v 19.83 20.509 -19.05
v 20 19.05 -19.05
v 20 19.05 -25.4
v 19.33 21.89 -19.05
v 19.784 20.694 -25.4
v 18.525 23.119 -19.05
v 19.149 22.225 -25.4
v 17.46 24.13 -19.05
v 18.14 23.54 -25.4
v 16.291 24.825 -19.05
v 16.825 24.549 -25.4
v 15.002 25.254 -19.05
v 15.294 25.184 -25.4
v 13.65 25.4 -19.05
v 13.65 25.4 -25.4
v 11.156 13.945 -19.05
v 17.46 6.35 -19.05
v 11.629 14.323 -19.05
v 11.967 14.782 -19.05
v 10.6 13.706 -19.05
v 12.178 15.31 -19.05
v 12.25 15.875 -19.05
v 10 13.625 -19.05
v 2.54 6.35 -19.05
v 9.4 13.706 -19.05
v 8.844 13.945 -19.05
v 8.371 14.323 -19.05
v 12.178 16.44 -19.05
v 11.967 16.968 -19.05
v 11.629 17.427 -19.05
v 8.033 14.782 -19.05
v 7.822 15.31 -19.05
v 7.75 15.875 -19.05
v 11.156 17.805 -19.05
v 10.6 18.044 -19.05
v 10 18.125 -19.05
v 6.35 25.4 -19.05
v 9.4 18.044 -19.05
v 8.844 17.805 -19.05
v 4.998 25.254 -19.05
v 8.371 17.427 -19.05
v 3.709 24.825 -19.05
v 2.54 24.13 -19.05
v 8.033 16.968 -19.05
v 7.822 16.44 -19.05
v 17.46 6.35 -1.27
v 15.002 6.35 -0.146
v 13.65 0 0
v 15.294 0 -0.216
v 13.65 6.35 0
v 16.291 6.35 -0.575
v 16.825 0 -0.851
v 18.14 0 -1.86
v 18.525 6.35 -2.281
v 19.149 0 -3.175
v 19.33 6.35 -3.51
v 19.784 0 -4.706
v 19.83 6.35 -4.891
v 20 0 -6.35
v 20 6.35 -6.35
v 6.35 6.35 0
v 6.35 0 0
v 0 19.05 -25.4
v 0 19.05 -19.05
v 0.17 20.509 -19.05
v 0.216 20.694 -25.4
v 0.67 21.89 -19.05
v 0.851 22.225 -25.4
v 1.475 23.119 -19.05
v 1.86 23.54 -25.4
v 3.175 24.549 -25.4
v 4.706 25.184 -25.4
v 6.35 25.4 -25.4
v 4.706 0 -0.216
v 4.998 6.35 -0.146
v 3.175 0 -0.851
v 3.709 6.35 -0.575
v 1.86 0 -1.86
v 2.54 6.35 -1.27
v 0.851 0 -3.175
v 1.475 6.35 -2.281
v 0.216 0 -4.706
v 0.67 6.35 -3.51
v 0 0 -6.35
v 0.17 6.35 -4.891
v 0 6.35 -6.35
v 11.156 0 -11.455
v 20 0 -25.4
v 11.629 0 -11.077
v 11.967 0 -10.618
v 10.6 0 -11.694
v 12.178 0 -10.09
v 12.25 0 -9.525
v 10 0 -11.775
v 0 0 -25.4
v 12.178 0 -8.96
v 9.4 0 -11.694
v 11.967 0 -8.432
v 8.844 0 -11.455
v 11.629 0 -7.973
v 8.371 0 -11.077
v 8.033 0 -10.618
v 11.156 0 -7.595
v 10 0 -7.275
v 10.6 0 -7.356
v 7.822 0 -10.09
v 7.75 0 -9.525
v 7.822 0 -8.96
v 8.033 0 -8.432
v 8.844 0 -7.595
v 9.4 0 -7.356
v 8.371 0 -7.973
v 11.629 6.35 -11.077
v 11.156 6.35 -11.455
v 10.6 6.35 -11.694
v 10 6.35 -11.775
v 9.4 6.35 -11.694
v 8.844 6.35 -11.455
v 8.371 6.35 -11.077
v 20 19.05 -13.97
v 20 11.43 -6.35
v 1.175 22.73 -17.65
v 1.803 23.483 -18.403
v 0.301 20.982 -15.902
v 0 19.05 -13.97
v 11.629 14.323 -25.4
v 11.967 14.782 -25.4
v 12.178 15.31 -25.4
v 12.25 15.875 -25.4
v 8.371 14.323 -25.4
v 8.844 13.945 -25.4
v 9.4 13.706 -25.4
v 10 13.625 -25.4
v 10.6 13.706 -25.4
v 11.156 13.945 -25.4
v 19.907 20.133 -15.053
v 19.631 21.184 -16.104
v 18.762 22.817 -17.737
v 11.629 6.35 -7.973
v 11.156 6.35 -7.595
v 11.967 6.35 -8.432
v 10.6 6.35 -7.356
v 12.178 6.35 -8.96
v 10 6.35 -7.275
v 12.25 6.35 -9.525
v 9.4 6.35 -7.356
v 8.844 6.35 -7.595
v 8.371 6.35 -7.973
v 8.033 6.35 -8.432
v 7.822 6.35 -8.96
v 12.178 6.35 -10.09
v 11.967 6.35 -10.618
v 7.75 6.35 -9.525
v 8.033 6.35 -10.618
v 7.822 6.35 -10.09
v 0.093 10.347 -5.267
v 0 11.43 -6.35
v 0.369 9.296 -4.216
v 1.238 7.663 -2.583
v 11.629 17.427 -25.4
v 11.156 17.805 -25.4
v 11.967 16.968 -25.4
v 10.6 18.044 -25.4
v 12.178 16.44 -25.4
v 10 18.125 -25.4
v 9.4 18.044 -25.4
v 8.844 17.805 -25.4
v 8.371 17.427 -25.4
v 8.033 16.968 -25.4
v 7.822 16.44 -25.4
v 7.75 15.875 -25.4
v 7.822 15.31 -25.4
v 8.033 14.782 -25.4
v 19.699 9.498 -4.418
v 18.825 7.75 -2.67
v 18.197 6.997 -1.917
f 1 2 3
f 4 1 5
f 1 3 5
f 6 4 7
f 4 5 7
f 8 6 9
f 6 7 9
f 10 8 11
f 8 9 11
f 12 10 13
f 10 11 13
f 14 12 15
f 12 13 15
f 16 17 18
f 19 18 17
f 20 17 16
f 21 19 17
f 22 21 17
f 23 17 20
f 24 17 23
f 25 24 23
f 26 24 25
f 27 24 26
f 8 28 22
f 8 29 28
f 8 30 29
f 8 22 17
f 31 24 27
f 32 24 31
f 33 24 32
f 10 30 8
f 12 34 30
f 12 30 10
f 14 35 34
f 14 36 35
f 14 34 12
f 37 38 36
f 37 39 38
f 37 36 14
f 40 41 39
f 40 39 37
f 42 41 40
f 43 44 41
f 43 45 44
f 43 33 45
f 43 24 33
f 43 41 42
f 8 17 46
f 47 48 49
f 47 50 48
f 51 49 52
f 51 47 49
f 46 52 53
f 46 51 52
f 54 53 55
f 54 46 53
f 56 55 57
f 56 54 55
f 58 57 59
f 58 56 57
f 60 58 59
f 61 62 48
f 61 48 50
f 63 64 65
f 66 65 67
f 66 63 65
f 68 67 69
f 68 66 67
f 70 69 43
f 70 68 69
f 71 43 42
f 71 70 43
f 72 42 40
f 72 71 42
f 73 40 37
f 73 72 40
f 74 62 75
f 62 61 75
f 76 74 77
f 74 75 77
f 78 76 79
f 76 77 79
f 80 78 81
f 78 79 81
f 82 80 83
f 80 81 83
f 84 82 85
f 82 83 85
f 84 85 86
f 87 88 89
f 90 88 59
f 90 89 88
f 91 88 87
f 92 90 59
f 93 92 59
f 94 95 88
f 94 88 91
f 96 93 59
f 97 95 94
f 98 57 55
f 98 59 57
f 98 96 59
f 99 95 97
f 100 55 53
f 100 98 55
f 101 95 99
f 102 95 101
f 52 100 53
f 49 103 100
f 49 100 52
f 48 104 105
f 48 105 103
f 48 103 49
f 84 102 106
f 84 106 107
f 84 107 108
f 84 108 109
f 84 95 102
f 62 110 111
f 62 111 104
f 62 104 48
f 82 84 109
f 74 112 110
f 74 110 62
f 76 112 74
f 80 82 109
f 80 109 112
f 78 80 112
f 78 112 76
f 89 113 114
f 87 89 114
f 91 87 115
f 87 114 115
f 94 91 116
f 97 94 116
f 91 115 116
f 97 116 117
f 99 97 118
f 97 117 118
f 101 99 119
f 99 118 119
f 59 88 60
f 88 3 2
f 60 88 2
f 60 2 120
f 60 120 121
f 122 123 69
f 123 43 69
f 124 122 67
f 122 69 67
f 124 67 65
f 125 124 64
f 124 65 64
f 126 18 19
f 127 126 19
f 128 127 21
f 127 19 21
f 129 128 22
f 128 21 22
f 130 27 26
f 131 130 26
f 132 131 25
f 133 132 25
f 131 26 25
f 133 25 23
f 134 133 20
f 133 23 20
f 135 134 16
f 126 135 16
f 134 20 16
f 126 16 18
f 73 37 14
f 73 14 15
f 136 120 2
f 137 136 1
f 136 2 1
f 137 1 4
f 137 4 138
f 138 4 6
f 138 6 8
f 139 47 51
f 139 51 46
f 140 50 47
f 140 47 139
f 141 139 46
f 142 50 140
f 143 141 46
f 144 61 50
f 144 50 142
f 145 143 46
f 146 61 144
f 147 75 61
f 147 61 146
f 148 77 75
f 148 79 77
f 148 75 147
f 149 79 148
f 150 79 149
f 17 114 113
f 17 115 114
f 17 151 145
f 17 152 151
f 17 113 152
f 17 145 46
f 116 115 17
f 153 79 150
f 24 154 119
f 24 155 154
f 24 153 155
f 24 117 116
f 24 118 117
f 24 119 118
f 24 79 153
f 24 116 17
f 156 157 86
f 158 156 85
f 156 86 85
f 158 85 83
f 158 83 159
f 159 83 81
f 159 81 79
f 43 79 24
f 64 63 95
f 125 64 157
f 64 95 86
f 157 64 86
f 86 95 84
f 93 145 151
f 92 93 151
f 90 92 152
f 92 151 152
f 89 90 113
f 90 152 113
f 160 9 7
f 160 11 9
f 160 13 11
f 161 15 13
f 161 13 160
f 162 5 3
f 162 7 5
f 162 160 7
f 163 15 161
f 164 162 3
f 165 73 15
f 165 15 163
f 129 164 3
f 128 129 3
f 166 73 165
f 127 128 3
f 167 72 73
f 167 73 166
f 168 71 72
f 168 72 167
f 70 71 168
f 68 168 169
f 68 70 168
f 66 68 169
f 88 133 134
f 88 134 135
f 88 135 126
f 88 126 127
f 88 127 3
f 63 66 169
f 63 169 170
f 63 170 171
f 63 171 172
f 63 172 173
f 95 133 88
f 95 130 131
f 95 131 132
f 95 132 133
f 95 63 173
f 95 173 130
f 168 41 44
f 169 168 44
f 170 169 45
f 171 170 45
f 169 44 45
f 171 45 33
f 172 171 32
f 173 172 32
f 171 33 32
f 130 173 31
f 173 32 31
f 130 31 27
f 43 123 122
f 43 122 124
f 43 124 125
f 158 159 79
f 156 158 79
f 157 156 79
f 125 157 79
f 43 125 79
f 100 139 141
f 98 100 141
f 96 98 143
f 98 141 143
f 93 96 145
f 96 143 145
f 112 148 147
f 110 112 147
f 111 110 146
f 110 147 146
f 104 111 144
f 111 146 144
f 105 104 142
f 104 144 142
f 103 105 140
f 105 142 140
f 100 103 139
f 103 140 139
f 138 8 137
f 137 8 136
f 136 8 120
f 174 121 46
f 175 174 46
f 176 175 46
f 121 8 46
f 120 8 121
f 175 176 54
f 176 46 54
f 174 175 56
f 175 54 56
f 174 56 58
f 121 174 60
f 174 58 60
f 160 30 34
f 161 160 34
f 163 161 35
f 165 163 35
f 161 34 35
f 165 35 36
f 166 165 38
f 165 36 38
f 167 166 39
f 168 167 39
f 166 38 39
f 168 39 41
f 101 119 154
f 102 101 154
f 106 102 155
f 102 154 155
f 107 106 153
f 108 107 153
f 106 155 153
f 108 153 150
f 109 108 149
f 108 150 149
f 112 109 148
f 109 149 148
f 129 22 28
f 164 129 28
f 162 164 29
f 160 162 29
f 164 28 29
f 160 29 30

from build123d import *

# Parameters (mm, degrees)
BOSS_EXTRUDE1_DEPTH = 20
CUT_EXTRUDE1_DEPTH  = 20
CUT_EXTRUDE2_DEPTH  = 20
FILLET1_R           = 6.35
BOSS_EXTRUDE2_DEPTH = 19.05
CUT_EXTRUDE3_DEPTH  = 20.05
CUT_EXTRUDE4_DEPTH  = 21


with BuildPart() as part:
    # Sketch1 → Boss-Extrude1 (new body)
    with BuildSketch(Plane(origin=(0, 0, 0), x_dir=(0, 0, -1), z_dir=(1, 0, 0))):
        Polygon((0, 0), (0, 6.35), (19.05, 6.35), (19.05, 25.4), (25.4, 25.4), (25.4, 0), align=None)
    extrude(amount=BOSS_EXTRUDE1_DEPTH)

    # Sketch2 → Cut-Extrude1 (cut)
    with BuildSketch(Plane(origin=(0, 6.35, 0), x_dir=(1, 0, 0), z_dir=(0, 1, 0))):
        with BuildLine():
            ThreePointArc((8.37078656, 11.076825802), (7.750000055, 9.525), (8.37078656, 7.973174198))
            Line((8.37078656, 7.973174198), (10, 9.525))
            Line((10, 9.525), (8.37078656, 11.076825802))
        make_face()
        with BuildLine():
            Line((10, 9.525), (8.37078656, 7.973174198))
            ThreePointArc((8.37078656, 7.973174198), (10, 7.275000055), (11.62921344, 7.973174198))
            Line((11.62921344, 7.973174198), (10, 9.525))
        make_face()
        with BuildLine():
            Line((8.37078656, 11.076825802), (10, 9.525))
            Line((10, 9.525), (11.62921344, 11.076825802))
            ThreePointArc((11.62921344, 11.076825802), (10, 11.774999945), (8.37078656, 11.076825802))
        make_face()
        with BuildLine():
            Line((11.62921344, 11.076825802), (10, 9.525))
            Line((10, 9.525), (11.62921344, 7.973174198))
            ThreePointArc((11.62921344, 7.973174198), (12.089046422, 8.689305797), (12.249999945, 9.525))
            ThreePointArc((12.249999945, 9.525), (12.089046422, 10.360694203), (11.62921344, 11.076825802))
        make_face()
    extrude(amount=-CUT_EXTRUDE1_DEPTH, mode=Mode.SUBTRACT)

    # Sketch3 → Cut-Extrude2 (cut)
    with BuildSketch(Plane.XY.offset(-19.05)):
        with BuildLine():
            ThreePointArc((8.37078652, 17.42682584), (7.75, 15.875), (8.37078652, 14.32317416))
            Line((8.37078652, 14.32317416), (10, 15.875))
            Line((10, 15.875), (8.37078652, 17.42682584))
        make_face()
        with BuildLine():
            Line((10, 15.875), (8.37078652, 14.32317416))
            ThreePointArc((8.37078652, 14.32317416), (10, 13.625), (11.62921348, 14.32317416))
            Line((11.62921348, 14.32317416), (10, 15.875))
        make_face()
        with BuildLine():
            Line((8.37078652, 17.42682584), (10, 15.875))
            Line((10, 15.875), (11.62921348, 17.42682584))
            ThreePointArc((11.62921348, 17.42682584), (10, 18.125), (8.37078652, 17.42682584))
        make_face()
        with BuildLine():
            Line((11.62921348, 17.42682584), (10, 15.875))
            Line((10, 15.875), (11.62921348, 14.32317416))
            ThreePointArc((11.62921348, 14.32317416), (12.089046473, 15.039305777), (12.25, 15.875))
            ThreePointArc((12.25, 15.875), (12.089046473, 16.710694223), (11.62921348, 17.42682584))
        make_face()
    extrude(amount=-CUT_EXTRUDE2_DEPTH, mode=Mode.SUBTRACT)

    # Fillet1
    fillet1_edges = [part.edges().sort_by_distance(p)[0] for p in [
        (20, 25.4, -22.225),
        (20, 3.175, 0),
        (0, 3.175, 0),
        (0, 25.4, -22.225),
    ]]
    fillet(fillet1_edges, radius=FILLET1_R)

    # Sketch4 → Boss-Extrude2 (add)
    with BuildSketch(Plane(origin=(0, 6.35, 0), x_dir=(1, 0, 0), z_dir=(0, 1, 0))):
        with BuildLine():
            Line((2.54, 1.27), (2.54, 19.05))
            Line((2.54, 19.05), (0, 19.05))
            Line((0, 19.05), (0, 6.35))
            ThreePointArc((0, 6.35), (0.670387337, 3.510193669), (2.54, 1.27))
        make_face()
        with BuildLine():
            Line((20, 19.05), (17.46, 19.05))
            Line((17.46, 19.05), (17.46, 1.27))
            ThreePointArc((17.46, 1.27), (19.329612663, 3.510193669), (20, 6.35))
            Line((20, 6.35), (20, 19.05))
        make_face()
    extrude(amount=BOSS_EXTRUDE2_DEPTH)

    # Sketch5 → Cut-Extrude3 (cut, through all)
    with BuildSketch(Plane(origin=(0, 0, -19.05), x_dir=(-1, 0, 0), z_dir=(0, 0, -1))):
        with BuildLine():
            Line((0, 19.05), (0, 25.4))
            Line((0, 25.4), (-2.54, 25.4))
            Line((-2.54, 25.4), (-2.54, 24.13))
            ThreePointArc((-2.54, 24.13), (-0.670387337, 21.889806331), (0, 19.05))
        make_face()
        with BuildLine():
            Line((-17.46, 24.13), (-17.46, 25.4))
            Line((-17.46, 25.4), (-20, 25.4))
            Line((-20, 25.4), (-20, 19.05))
            ThreePointArc((-20, 19.05), (-19.329612663, 21.889806331), (-17.46, 24.13))
        make_face()
    extrude(amount=-CUT_EXTRUDE3_DEPTH, mode=Mode.SUBTRACT)

    # Sketch6 → Cut-Extrude4 (cut, through all)
    with BuildSketch(Plane.ZY):
        Polygon((-13.97, 19.05), (-6.35, 19.05), (-6.35, 11.43), (-1.27, 6.35), (-1.27, 24.13), (-19.05, 24.13), align=None)
        Polygon((-6.35, 11.43), (-6.35, 19.05), (-13.97, 19.05), align=None)
    extrude(amount=-CUT_EXTRUDE4_DEPTH, mode=Mode.SUBTRACT)


solid = part.part
